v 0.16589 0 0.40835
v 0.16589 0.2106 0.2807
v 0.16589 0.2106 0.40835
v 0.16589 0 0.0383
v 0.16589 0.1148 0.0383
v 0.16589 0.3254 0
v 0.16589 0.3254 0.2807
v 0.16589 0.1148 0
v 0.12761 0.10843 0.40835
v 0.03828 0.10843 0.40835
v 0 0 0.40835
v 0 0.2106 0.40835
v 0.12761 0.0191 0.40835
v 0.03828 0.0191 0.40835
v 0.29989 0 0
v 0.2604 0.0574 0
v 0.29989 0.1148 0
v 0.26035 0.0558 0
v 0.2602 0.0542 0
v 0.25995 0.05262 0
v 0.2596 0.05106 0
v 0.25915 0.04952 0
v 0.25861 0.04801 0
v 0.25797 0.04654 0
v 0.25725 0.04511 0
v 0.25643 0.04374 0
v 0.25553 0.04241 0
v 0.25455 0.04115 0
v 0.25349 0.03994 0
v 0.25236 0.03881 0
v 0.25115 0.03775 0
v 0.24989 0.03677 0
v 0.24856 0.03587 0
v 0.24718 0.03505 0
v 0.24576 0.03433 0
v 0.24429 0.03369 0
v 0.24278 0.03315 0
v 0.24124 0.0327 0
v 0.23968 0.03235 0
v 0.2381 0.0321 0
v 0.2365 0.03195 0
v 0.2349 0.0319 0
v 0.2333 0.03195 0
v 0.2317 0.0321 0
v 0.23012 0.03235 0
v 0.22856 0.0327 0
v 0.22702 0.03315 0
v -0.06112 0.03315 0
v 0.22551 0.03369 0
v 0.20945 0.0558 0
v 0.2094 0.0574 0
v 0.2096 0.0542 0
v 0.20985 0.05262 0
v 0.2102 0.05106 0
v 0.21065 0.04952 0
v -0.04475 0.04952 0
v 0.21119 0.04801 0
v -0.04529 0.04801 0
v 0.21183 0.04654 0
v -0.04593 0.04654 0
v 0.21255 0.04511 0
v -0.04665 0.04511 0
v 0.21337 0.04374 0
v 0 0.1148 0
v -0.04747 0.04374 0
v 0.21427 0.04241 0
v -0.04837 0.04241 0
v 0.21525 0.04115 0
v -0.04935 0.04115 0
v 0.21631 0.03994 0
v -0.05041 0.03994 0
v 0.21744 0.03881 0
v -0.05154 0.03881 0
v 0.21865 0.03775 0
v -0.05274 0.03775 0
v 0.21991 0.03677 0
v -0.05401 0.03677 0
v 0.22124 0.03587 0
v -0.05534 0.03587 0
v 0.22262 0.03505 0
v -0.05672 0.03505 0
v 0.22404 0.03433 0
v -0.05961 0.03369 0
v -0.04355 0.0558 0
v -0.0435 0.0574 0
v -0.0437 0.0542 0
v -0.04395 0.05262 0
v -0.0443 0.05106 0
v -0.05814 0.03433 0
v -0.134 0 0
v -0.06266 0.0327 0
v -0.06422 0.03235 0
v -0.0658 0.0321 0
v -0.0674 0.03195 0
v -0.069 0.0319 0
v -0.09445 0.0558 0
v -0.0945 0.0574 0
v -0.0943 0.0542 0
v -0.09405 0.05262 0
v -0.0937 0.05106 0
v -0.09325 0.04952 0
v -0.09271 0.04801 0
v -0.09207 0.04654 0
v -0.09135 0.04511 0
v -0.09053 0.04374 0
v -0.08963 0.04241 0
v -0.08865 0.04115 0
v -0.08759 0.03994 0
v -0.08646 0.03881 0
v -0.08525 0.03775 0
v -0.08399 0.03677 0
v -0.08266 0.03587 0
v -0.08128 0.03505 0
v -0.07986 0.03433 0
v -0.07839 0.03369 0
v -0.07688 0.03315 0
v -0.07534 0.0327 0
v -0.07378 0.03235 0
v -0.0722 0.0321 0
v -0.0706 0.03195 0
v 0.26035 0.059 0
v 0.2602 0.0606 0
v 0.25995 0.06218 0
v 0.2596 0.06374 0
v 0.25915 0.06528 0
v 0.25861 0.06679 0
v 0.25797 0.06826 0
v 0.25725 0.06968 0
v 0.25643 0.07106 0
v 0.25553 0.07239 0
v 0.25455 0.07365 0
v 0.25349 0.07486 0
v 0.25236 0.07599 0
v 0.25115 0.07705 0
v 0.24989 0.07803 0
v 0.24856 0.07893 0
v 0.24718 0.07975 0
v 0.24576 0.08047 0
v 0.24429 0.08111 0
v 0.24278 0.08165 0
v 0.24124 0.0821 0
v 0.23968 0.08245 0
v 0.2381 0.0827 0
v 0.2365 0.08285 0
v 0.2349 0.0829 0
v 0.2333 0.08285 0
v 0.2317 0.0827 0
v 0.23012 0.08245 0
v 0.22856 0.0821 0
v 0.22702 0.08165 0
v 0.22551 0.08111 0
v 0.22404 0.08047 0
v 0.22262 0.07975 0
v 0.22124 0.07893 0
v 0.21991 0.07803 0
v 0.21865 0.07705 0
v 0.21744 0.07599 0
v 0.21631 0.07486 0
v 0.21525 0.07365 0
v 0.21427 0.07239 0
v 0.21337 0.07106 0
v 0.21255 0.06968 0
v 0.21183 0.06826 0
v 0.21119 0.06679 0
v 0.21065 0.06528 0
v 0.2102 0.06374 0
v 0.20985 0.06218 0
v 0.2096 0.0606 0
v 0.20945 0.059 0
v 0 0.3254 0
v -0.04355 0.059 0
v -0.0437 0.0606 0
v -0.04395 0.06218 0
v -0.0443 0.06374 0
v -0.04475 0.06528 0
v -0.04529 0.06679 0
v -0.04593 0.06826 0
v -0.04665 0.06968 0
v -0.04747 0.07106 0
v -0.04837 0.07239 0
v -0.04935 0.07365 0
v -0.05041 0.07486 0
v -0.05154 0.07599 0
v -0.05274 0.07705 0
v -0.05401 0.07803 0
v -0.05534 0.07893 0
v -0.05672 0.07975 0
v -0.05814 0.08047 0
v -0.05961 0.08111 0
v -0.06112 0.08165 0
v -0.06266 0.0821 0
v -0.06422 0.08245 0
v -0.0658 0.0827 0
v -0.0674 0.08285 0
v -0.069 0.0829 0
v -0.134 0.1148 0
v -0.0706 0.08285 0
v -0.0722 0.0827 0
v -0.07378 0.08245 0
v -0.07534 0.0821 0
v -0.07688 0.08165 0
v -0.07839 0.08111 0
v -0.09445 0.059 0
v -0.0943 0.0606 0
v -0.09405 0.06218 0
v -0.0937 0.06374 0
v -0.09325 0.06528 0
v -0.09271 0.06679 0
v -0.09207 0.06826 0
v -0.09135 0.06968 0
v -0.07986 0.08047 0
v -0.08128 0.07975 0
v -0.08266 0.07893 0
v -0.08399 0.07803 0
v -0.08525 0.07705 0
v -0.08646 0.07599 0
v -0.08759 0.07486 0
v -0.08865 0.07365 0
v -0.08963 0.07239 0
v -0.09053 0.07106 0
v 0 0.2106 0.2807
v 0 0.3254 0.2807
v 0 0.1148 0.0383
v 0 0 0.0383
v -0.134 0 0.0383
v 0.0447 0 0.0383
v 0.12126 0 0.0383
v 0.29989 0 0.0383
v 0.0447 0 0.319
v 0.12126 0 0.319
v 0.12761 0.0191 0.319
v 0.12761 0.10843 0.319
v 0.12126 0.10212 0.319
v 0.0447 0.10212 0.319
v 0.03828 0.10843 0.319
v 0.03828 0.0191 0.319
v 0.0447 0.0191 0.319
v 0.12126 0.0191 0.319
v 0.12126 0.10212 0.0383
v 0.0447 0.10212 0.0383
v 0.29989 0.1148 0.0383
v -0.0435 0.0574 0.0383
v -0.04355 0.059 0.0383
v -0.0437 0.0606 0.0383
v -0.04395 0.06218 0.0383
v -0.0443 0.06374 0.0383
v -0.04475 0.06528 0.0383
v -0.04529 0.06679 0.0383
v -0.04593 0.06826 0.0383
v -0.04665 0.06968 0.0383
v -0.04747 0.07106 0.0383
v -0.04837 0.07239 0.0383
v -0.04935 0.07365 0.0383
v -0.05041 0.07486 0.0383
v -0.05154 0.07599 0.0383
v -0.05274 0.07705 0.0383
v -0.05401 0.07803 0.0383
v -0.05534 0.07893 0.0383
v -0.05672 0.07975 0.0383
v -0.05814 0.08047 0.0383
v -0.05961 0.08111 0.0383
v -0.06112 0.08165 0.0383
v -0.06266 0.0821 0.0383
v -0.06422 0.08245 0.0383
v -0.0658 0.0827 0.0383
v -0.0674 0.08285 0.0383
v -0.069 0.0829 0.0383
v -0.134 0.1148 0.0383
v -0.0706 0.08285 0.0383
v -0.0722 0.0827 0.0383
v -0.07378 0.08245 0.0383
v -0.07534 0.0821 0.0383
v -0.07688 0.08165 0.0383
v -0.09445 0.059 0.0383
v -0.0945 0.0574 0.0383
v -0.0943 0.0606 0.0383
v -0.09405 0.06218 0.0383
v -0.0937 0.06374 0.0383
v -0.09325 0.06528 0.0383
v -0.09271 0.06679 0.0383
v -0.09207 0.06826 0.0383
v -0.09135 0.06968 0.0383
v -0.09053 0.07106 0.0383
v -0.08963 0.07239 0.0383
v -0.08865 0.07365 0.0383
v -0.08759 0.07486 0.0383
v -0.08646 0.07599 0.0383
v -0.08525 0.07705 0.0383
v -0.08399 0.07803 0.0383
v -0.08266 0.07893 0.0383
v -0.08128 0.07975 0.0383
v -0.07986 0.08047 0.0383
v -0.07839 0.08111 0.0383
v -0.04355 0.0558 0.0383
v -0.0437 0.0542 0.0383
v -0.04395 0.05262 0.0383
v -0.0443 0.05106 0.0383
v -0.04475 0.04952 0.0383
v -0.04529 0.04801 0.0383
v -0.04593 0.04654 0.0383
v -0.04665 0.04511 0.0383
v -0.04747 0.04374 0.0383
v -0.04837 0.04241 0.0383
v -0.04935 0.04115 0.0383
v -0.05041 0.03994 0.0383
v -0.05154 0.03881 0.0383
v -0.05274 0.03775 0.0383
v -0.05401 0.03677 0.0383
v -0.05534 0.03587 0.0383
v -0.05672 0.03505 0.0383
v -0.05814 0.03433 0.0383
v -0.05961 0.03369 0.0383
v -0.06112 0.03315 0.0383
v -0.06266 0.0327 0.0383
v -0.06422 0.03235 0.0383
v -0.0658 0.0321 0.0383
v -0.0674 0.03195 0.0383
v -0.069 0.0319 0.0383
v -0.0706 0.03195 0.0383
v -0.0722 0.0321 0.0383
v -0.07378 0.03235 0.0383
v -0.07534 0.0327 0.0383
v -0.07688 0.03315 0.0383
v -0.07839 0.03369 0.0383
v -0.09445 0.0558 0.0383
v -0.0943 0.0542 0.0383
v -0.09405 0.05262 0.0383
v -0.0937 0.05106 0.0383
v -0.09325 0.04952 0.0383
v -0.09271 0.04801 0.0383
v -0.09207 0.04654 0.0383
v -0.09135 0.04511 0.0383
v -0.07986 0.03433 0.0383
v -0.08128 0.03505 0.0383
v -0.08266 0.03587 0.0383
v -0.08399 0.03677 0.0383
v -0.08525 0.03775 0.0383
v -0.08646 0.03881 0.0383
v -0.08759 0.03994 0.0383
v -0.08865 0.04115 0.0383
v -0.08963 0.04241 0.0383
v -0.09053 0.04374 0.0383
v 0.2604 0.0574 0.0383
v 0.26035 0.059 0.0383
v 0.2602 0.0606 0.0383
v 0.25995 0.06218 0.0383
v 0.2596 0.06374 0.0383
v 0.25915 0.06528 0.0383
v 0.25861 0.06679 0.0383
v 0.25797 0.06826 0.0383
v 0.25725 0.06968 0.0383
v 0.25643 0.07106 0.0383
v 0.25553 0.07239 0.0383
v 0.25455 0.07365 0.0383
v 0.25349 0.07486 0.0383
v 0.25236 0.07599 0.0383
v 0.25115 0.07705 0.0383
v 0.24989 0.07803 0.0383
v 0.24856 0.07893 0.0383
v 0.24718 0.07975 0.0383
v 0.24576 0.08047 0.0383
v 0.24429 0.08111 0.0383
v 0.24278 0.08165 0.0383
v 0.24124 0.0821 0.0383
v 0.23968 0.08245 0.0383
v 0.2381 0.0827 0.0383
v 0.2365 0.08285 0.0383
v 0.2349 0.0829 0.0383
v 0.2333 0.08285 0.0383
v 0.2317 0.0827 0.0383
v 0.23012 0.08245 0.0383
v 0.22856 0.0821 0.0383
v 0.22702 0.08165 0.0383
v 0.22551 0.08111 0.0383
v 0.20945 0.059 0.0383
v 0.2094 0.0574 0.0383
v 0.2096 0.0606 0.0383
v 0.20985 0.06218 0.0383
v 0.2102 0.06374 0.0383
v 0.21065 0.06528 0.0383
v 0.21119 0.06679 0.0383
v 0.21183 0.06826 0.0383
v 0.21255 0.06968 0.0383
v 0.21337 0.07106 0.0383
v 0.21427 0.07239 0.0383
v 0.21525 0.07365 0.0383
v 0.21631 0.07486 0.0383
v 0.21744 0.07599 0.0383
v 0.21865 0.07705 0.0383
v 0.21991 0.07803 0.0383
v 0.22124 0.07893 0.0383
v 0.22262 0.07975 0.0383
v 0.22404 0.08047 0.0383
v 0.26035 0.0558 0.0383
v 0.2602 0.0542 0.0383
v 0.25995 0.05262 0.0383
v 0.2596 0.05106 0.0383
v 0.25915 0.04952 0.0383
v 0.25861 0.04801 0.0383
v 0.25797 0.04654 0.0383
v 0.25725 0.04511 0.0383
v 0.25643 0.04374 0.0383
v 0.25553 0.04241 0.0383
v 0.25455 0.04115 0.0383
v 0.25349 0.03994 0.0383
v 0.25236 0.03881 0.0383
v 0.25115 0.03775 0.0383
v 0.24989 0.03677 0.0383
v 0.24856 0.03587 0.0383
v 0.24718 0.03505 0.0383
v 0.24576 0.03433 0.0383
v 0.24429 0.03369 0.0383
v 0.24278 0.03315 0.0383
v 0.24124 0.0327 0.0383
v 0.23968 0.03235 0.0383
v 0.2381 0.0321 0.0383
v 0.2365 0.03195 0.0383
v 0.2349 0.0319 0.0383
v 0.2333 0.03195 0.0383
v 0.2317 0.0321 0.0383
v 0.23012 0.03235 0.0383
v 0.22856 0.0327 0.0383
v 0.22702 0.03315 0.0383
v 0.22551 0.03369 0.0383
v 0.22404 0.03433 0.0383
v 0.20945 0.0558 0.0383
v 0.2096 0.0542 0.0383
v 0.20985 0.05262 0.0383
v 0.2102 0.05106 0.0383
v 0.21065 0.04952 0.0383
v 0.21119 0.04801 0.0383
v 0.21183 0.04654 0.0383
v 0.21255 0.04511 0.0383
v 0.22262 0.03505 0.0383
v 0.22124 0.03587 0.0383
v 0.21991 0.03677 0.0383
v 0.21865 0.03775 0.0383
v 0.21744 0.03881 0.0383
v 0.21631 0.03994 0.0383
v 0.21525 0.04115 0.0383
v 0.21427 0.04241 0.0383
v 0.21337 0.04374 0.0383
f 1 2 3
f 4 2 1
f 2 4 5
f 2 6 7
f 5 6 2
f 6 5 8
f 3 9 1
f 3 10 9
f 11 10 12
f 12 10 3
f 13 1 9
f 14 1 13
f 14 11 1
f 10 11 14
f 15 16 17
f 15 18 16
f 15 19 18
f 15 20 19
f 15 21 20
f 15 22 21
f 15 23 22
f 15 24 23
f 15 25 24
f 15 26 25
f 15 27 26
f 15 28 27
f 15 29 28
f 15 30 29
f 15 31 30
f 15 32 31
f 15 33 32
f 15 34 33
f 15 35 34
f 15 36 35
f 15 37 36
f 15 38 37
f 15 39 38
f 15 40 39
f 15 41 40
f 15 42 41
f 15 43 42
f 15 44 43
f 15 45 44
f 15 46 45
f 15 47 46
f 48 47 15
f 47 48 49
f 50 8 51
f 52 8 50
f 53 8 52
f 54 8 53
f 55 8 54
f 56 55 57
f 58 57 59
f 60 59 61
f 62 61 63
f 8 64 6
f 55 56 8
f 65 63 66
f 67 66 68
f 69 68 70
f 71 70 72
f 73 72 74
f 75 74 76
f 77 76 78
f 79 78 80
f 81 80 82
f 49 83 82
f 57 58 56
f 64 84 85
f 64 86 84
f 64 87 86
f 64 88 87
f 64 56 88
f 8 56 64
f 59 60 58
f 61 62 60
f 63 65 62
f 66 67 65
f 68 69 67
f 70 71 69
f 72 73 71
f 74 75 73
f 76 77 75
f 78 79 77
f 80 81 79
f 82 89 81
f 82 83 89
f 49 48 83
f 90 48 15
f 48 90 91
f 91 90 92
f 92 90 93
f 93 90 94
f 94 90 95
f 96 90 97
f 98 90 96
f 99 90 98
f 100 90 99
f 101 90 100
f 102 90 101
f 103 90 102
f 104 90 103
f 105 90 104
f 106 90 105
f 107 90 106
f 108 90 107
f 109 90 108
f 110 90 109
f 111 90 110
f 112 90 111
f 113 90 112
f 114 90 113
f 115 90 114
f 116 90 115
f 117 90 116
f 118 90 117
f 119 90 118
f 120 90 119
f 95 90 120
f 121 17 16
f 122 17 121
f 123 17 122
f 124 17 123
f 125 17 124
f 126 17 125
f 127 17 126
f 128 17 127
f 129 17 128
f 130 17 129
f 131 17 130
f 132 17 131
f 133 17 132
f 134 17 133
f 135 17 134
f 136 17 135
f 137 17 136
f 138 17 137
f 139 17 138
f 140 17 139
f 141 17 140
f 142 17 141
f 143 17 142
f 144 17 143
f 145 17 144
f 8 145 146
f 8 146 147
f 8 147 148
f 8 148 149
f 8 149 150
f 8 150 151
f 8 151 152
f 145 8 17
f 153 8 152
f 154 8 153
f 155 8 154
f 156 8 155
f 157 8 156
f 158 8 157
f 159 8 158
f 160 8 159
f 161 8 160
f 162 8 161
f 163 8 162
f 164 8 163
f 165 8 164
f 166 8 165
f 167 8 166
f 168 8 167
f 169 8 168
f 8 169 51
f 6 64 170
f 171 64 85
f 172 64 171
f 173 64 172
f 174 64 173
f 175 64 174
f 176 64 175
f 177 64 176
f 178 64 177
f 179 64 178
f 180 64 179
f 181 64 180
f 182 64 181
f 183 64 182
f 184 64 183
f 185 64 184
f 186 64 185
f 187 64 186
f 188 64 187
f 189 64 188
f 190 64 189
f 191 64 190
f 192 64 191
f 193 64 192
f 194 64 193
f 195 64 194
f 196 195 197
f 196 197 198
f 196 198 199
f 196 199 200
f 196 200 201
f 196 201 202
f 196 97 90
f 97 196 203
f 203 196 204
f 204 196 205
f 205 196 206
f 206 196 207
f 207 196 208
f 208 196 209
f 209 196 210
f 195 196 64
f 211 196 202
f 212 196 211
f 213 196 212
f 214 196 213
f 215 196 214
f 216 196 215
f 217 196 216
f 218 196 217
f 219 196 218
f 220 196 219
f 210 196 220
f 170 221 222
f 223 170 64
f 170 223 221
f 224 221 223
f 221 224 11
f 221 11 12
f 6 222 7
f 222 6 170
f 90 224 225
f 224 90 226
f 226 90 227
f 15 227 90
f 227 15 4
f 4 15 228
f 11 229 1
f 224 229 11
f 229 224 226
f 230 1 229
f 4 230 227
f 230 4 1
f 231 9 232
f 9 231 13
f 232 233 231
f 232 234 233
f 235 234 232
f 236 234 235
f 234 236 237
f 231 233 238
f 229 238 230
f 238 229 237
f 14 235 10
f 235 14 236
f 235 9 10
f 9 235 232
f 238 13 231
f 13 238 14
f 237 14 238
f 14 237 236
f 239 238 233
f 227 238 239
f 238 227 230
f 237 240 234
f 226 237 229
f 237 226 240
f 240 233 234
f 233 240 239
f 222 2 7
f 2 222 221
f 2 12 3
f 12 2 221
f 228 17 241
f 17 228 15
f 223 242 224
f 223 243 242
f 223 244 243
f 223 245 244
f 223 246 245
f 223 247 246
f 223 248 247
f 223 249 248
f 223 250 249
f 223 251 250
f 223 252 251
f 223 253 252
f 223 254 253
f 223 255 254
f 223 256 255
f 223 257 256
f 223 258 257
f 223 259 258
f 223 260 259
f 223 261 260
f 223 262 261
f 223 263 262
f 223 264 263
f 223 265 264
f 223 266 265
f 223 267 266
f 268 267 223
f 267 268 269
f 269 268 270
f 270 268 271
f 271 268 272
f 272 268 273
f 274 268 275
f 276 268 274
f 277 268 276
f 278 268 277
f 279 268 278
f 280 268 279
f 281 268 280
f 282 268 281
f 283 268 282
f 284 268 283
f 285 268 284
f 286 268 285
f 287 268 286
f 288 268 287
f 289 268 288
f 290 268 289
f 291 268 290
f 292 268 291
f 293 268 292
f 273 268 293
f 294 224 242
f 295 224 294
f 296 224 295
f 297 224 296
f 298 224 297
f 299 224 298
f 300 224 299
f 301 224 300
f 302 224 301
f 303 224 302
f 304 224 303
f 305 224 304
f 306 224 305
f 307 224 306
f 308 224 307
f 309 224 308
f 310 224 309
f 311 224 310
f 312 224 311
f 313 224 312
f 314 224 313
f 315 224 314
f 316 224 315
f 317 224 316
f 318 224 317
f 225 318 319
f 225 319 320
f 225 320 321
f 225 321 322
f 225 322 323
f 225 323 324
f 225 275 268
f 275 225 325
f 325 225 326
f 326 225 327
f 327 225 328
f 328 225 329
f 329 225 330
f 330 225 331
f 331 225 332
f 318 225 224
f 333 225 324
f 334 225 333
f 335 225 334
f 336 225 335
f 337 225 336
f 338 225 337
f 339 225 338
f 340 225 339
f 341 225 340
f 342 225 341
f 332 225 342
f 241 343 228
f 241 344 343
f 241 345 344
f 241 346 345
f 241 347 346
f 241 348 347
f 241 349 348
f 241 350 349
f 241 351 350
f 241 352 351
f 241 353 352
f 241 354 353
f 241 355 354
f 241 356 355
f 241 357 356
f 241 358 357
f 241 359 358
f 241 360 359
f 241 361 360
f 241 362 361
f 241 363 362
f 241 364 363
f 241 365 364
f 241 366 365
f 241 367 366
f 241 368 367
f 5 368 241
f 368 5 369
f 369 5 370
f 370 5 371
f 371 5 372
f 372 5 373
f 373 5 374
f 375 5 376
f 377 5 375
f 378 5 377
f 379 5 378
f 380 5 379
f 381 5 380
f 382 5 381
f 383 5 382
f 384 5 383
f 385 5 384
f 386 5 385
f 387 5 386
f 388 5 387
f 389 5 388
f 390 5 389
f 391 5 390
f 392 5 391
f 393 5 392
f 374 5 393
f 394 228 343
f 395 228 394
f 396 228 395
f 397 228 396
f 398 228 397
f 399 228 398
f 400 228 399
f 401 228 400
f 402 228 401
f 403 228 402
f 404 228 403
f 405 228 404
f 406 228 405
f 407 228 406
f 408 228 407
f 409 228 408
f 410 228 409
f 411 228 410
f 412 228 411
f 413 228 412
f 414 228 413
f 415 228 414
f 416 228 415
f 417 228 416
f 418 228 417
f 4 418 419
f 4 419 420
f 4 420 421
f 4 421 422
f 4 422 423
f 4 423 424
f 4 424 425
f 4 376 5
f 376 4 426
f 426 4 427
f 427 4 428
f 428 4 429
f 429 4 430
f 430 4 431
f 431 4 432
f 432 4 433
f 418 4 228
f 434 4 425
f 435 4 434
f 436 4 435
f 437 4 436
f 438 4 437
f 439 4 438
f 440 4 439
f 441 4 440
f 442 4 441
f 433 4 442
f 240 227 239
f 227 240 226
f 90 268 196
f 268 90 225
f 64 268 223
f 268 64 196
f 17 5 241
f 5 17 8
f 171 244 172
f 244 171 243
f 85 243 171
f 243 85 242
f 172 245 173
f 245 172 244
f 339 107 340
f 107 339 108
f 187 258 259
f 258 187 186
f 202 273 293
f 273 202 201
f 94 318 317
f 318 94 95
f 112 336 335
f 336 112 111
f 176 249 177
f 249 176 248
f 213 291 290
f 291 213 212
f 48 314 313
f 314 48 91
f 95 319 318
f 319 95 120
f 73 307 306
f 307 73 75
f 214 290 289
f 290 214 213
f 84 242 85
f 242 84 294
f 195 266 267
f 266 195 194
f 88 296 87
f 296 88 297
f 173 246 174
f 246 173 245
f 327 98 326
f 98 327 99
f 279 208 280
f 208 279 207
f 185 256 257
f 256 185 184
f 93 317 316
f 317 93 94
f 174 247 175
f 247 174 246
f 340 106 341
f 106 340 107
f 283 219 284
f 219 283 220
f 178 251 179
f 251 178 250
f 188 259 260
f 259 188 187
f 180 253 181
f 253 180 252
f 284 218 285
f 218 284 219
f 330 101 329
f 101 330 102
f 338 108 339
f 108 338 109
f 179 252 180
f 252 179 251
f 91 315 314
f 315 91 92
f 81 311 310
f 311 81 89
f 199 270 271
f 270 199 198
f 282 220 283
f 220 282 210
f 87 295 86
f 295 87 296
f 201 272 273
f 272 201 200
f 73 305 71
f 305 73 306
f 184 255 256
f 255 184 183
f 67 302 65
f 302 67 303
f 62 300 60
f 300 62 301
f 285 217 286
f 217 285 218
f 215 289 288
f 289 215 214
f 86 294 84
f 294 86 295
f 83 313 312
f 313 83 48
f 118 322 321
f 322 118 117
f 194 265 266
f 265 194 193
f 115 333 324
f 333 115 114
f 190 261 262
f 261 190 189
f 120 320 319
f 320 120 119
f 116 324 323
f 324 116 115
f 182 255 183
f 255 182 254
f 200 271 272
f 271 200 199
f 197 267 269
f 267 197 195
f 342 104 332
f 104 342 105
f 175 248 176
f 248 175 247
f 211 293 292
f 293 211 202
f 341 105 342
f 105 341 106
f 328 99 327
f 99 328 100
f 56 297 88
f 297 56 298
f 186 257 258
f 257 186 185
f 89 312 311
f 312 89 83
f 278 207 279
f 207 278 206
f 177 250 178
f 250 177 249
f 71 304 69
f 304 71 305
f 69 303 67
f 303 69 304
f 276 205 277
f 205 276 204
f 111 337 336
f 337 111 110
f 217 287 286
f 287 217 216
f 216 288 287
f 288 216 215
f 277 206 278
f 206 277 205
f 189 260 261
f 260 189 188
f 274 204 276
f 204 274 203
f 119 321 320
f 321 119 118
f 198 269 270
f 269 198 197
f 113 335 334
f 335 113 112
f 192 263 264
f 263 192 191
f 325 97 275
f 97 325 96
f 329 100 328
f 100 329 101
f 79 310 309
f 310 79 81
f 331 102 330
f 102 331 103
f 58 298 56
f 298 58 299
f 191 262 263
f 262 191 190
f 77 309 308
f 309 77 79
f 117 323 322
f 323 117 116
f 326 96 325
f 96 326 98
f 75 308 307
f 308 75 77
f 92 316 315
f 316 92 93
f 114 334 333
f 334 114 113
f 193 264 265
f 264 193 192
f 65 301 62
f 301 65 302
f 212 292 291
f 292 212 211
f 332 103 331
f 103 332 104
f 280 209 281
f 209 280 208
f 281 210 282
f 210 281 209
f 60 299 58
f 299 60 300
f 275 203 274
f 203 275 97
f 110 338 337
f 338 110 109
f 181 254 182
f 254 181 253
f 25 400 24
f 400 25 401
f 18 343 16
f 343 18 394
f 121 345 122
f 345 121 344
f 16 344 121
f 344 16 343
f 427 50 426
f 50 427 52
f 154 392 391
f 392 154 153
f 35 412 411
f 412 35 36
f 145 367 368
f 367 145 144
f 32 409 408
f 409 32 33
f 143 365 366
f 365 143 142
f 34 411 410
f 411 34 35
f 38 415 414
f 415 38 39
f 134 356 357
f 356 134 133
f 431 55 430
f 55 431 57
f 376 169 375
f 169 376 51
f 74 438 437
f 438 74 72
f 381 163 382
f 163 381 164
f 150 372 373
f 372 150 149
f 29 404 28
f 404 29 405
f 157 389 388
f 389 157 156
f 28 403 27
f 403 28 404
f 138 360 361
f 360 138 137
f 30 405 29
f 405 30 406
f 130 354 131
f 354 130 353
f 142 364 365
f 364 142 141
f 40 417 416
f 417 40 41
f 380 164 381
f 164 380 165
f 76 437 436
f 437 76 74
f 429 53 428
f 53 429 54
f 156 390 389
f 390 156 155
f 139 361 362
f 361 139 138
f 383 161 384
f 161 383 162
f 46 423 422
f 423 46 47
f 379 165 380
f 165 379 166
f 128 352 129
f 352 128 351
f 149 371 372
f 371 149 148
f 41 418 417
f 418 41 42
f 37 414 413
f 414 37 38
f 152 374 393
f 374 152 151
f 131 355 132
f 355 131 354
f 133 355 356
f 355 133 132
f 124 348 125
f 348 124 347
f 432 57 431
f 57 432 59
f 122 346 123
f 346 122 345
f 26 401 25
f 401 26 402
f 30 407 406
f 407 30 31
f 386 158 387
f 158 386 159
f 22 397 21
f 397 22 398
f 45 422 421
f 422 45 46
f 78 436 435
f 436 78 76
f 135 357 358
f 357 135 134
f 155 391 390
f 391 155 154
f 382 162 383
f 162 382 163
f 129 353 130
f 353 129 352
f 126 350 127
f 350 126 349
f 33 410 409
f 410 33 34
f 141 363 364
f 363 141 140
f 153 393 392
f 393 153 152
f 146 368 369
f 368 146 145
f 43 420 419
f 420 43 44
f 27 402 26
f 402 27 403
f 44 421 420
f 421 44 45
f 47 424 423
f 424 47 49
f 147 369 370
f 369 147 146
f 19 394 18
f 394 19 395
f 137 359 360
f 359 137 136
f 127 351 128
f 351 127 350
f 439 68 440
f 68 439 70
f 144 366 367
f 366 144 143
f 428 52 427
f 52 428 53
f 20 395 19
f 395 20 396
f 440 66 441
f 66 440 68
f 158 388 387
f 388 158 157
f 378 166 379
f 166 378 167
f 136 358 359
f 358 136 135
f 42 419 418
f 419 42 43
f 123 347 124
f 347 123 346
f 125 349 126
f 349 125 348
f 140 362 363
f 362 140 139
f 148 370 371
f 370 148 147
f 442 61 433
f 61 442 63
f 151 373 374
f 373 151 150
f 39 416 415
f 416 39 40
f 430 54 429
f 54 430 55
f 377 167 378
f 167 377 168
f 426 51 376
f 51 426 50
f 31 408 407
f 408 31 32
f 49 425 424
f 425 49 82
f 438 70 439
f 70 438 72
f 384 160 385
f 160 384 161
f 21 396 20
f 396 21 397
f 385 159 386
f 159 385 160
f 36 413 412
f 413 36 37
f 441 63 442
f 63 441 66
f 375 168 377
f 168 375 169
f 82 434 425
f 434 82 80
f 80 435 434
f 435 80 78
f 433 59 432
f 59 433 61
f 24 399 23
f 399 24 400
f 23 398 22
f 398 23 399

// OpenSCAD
// Parameters
$fn = 100;

// Main base dimensions
base_length = 0.165891;
base_width = 0.325401;
base_height = 0.408347;

// Square recess (top pocket)
sq_recess_size = 0.089326;
sq_recess_front = 0.0191;
sq_recess_z = 0.319;

// Lower rectangular opening (breaks through front face)
lower_w = 0.076565;
lower_d = 0.132416;
lower_left = 0.0447;
lower_front = -0.0303;
lower_z = 0.319;

// Upper back strip removal (step)
back_y = 0.2106;
back_w = 0.114848;
back_z = 0.2807;

// Shallow front base extension
shallow_h = 0.0383;
shallow_proj = 0.134;
shallow_y = 0.1148;

// Mounting holes in shallow extension
hole_r = 0.0255;
hole_front = 0.0574;
hole_x1 = -0.069;
hole_x2 = 0.2349;

// Main body with internal cutouts
module main_body() {
    difference() {
        cube([base_length, base_width, base_height]);
        
        // Square recess centered along length, from top
        translate([(base_length - sq_recess_size)/2, sq_recess_front, sq_recess_z])
            cube([sq_recess_size, sq_recess_size, base_height - sq_recess_z + 0.001]);
        
        // Lower opening through bottom vertical band
        translate([lower_left, lower_front, -0.001])
            cube([lower_w, lower_d, lower_z + 0.001]);
        
        // Back upper strip cutaway
        translate([-0.001, back_y, back_z])
            cube([base_length + 0.002, back_w, base_height - back_z + 0.001]);
    }
}

// Shallow projecting front section
module front_extension() {
    translate([-shallow_proj, 0, 0])
        cube([base_length + 2*shallow_proj, shallow_y, shallow_h]);
}

// Assembly
difference() {
    union() {
        main_body();
        front_extension();
    }
    
    // Two through holes in front extension
    translate([hole_x1, hole_front, -0.001])
        cylinder(h = shallow_h + 0.002, r = hole_r);
    
    translate([hole_x2, hole_front, -0.001])
        cylinder(h = shallow_h + 0.002, r = hole_r);
}
